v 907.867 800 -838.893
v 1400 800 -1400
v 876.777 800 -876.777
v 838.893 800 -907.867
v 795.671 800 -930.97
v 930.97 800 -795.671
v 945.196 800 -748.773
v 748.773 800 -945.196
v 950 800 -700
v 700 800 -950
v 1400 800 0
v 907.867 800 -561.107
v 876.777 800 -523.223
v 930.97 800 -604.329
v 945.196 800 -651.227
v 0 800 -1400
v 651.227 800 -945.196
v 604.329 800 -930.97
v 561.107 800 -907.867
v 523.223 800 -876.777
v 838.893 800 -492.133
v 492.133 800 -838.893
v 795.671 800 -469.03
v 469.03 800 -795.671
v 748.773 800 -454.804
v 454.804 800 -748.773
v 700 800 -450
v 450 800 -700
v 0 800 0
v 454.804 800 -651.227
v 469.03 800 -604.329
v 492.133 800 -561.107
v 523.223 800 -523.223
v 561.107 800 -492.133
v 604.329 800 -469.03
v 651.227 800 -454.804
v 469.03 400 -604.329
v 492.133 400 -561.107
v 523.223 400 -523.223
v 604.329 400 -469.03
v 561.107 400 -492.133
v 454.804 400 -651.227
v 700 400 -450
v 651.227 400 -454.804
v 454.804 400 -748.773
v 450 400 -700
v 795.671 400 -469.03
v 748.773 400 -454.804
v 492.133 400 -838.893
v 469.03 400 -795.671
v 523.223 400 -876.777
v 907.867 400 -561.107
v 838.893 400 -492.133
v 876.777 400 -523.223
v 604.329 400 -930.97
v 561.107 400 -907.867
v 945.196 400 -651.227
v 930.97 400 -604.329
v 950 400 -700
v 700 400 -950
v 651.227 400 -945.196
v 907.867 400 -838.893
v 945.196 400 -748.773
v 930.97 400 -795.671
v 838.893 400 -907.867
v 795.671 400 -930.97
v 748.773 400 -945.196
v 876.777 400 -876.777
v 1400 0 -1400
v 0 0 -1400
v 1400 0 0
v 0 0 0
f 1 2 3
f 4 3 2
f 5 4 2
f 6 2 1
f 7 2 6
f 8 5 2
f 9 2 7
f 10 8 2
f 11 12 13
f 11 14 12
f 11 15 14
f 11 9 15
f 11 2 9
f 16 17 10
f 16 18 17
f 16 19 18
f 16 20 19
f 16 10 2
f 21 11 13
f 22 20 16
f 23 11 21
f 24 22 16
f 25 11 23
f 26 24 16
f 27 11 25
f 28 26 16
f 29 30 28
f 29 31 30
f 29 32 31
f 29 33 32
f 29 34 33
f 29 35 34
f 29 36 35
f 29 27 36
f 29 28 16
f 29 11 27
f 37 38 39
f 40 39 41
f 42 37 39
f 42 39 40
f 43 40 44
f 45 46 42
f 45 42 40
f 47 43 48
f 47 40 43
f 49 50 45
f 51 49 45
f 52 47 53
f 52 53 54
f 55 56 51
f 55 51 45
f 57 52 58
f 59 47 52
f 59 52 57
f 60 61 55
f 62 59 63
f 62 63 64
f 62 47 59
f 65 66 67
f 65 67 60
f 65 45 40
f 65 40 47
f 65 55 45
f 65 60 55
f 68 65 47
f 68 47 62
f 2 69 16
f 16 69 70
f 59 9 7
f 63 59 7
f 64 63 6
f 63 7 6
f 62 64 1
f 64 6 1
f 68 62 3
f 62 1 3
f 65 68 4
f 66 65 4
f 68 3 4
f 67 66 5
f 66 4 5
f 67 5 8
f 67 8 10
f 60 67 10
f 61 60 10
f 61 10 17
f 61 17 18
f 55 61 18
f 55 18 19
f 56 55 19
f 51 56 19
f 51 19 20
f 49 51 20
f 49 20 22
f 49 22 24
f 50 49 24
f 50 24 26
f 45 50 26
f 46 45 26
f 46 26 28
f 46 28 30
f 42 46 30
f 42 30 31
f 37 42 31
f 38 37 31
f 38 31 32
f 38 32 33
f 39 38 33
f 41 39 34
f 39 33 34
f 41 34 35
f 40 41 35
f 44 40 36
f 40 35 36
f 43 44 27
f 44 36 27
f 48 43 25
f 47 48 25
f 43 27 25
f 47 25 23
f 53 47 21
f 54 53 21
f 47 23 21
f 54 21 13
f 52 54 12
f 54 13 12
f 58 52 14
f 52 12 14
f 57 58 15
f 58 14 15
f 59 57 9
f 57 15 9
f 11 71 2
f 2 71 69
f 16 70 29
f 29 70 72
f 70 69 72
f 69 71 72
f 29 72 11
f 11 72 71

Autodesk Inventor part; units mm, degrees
ref_plane "YZ Plane" through (0, 0, 0) normal (1, 0, 0) x (0, 1, 0)
ref_plane "XZ Plane" through (0, 0, 0) normal (0, 1, 0) x (-1, 0, 0)
ref_plane "XY Plane" through (0, 0, 0) normal (0, 0, 1) x (1, 0, 0)
sketch "Boceto1" plane through (0, 0, 0) normal (0, 1, 0) x (-1, 0, 0)
  line L0 (0, 0) -> (-1400, 0)
  line L1 (-1400, 0) -> (-1400, -1400)
  line L2 (-1400, -1400) -> (0, -1400)
  line L3 (0, -1400) -> (0, 0)
  dimension "d0" = 1400
  dimension "d1" = 1400
extrude "Extrusión1" add sketch "Boceto1" along normal blind 800
sketch "Boceto2" plane through (0, 800, 0) normal (0, 1, 0) x (1, 0, 0)
  line L0 (0, 0) -> (800, 0)
  circle A0 centre (700, 700) radius 250
  line L1 (0, 1400) -> (0, 0) projected
  line L2 (1400, 1400) -> (0, 1400) projected
  dimension "d6" = 500
  dimension "d9" = 700
  dimension "d10" = 700
extrude "Extrusión2" cut sketch "Boceto2" against normal blind 400
properties part number "Soporte"
